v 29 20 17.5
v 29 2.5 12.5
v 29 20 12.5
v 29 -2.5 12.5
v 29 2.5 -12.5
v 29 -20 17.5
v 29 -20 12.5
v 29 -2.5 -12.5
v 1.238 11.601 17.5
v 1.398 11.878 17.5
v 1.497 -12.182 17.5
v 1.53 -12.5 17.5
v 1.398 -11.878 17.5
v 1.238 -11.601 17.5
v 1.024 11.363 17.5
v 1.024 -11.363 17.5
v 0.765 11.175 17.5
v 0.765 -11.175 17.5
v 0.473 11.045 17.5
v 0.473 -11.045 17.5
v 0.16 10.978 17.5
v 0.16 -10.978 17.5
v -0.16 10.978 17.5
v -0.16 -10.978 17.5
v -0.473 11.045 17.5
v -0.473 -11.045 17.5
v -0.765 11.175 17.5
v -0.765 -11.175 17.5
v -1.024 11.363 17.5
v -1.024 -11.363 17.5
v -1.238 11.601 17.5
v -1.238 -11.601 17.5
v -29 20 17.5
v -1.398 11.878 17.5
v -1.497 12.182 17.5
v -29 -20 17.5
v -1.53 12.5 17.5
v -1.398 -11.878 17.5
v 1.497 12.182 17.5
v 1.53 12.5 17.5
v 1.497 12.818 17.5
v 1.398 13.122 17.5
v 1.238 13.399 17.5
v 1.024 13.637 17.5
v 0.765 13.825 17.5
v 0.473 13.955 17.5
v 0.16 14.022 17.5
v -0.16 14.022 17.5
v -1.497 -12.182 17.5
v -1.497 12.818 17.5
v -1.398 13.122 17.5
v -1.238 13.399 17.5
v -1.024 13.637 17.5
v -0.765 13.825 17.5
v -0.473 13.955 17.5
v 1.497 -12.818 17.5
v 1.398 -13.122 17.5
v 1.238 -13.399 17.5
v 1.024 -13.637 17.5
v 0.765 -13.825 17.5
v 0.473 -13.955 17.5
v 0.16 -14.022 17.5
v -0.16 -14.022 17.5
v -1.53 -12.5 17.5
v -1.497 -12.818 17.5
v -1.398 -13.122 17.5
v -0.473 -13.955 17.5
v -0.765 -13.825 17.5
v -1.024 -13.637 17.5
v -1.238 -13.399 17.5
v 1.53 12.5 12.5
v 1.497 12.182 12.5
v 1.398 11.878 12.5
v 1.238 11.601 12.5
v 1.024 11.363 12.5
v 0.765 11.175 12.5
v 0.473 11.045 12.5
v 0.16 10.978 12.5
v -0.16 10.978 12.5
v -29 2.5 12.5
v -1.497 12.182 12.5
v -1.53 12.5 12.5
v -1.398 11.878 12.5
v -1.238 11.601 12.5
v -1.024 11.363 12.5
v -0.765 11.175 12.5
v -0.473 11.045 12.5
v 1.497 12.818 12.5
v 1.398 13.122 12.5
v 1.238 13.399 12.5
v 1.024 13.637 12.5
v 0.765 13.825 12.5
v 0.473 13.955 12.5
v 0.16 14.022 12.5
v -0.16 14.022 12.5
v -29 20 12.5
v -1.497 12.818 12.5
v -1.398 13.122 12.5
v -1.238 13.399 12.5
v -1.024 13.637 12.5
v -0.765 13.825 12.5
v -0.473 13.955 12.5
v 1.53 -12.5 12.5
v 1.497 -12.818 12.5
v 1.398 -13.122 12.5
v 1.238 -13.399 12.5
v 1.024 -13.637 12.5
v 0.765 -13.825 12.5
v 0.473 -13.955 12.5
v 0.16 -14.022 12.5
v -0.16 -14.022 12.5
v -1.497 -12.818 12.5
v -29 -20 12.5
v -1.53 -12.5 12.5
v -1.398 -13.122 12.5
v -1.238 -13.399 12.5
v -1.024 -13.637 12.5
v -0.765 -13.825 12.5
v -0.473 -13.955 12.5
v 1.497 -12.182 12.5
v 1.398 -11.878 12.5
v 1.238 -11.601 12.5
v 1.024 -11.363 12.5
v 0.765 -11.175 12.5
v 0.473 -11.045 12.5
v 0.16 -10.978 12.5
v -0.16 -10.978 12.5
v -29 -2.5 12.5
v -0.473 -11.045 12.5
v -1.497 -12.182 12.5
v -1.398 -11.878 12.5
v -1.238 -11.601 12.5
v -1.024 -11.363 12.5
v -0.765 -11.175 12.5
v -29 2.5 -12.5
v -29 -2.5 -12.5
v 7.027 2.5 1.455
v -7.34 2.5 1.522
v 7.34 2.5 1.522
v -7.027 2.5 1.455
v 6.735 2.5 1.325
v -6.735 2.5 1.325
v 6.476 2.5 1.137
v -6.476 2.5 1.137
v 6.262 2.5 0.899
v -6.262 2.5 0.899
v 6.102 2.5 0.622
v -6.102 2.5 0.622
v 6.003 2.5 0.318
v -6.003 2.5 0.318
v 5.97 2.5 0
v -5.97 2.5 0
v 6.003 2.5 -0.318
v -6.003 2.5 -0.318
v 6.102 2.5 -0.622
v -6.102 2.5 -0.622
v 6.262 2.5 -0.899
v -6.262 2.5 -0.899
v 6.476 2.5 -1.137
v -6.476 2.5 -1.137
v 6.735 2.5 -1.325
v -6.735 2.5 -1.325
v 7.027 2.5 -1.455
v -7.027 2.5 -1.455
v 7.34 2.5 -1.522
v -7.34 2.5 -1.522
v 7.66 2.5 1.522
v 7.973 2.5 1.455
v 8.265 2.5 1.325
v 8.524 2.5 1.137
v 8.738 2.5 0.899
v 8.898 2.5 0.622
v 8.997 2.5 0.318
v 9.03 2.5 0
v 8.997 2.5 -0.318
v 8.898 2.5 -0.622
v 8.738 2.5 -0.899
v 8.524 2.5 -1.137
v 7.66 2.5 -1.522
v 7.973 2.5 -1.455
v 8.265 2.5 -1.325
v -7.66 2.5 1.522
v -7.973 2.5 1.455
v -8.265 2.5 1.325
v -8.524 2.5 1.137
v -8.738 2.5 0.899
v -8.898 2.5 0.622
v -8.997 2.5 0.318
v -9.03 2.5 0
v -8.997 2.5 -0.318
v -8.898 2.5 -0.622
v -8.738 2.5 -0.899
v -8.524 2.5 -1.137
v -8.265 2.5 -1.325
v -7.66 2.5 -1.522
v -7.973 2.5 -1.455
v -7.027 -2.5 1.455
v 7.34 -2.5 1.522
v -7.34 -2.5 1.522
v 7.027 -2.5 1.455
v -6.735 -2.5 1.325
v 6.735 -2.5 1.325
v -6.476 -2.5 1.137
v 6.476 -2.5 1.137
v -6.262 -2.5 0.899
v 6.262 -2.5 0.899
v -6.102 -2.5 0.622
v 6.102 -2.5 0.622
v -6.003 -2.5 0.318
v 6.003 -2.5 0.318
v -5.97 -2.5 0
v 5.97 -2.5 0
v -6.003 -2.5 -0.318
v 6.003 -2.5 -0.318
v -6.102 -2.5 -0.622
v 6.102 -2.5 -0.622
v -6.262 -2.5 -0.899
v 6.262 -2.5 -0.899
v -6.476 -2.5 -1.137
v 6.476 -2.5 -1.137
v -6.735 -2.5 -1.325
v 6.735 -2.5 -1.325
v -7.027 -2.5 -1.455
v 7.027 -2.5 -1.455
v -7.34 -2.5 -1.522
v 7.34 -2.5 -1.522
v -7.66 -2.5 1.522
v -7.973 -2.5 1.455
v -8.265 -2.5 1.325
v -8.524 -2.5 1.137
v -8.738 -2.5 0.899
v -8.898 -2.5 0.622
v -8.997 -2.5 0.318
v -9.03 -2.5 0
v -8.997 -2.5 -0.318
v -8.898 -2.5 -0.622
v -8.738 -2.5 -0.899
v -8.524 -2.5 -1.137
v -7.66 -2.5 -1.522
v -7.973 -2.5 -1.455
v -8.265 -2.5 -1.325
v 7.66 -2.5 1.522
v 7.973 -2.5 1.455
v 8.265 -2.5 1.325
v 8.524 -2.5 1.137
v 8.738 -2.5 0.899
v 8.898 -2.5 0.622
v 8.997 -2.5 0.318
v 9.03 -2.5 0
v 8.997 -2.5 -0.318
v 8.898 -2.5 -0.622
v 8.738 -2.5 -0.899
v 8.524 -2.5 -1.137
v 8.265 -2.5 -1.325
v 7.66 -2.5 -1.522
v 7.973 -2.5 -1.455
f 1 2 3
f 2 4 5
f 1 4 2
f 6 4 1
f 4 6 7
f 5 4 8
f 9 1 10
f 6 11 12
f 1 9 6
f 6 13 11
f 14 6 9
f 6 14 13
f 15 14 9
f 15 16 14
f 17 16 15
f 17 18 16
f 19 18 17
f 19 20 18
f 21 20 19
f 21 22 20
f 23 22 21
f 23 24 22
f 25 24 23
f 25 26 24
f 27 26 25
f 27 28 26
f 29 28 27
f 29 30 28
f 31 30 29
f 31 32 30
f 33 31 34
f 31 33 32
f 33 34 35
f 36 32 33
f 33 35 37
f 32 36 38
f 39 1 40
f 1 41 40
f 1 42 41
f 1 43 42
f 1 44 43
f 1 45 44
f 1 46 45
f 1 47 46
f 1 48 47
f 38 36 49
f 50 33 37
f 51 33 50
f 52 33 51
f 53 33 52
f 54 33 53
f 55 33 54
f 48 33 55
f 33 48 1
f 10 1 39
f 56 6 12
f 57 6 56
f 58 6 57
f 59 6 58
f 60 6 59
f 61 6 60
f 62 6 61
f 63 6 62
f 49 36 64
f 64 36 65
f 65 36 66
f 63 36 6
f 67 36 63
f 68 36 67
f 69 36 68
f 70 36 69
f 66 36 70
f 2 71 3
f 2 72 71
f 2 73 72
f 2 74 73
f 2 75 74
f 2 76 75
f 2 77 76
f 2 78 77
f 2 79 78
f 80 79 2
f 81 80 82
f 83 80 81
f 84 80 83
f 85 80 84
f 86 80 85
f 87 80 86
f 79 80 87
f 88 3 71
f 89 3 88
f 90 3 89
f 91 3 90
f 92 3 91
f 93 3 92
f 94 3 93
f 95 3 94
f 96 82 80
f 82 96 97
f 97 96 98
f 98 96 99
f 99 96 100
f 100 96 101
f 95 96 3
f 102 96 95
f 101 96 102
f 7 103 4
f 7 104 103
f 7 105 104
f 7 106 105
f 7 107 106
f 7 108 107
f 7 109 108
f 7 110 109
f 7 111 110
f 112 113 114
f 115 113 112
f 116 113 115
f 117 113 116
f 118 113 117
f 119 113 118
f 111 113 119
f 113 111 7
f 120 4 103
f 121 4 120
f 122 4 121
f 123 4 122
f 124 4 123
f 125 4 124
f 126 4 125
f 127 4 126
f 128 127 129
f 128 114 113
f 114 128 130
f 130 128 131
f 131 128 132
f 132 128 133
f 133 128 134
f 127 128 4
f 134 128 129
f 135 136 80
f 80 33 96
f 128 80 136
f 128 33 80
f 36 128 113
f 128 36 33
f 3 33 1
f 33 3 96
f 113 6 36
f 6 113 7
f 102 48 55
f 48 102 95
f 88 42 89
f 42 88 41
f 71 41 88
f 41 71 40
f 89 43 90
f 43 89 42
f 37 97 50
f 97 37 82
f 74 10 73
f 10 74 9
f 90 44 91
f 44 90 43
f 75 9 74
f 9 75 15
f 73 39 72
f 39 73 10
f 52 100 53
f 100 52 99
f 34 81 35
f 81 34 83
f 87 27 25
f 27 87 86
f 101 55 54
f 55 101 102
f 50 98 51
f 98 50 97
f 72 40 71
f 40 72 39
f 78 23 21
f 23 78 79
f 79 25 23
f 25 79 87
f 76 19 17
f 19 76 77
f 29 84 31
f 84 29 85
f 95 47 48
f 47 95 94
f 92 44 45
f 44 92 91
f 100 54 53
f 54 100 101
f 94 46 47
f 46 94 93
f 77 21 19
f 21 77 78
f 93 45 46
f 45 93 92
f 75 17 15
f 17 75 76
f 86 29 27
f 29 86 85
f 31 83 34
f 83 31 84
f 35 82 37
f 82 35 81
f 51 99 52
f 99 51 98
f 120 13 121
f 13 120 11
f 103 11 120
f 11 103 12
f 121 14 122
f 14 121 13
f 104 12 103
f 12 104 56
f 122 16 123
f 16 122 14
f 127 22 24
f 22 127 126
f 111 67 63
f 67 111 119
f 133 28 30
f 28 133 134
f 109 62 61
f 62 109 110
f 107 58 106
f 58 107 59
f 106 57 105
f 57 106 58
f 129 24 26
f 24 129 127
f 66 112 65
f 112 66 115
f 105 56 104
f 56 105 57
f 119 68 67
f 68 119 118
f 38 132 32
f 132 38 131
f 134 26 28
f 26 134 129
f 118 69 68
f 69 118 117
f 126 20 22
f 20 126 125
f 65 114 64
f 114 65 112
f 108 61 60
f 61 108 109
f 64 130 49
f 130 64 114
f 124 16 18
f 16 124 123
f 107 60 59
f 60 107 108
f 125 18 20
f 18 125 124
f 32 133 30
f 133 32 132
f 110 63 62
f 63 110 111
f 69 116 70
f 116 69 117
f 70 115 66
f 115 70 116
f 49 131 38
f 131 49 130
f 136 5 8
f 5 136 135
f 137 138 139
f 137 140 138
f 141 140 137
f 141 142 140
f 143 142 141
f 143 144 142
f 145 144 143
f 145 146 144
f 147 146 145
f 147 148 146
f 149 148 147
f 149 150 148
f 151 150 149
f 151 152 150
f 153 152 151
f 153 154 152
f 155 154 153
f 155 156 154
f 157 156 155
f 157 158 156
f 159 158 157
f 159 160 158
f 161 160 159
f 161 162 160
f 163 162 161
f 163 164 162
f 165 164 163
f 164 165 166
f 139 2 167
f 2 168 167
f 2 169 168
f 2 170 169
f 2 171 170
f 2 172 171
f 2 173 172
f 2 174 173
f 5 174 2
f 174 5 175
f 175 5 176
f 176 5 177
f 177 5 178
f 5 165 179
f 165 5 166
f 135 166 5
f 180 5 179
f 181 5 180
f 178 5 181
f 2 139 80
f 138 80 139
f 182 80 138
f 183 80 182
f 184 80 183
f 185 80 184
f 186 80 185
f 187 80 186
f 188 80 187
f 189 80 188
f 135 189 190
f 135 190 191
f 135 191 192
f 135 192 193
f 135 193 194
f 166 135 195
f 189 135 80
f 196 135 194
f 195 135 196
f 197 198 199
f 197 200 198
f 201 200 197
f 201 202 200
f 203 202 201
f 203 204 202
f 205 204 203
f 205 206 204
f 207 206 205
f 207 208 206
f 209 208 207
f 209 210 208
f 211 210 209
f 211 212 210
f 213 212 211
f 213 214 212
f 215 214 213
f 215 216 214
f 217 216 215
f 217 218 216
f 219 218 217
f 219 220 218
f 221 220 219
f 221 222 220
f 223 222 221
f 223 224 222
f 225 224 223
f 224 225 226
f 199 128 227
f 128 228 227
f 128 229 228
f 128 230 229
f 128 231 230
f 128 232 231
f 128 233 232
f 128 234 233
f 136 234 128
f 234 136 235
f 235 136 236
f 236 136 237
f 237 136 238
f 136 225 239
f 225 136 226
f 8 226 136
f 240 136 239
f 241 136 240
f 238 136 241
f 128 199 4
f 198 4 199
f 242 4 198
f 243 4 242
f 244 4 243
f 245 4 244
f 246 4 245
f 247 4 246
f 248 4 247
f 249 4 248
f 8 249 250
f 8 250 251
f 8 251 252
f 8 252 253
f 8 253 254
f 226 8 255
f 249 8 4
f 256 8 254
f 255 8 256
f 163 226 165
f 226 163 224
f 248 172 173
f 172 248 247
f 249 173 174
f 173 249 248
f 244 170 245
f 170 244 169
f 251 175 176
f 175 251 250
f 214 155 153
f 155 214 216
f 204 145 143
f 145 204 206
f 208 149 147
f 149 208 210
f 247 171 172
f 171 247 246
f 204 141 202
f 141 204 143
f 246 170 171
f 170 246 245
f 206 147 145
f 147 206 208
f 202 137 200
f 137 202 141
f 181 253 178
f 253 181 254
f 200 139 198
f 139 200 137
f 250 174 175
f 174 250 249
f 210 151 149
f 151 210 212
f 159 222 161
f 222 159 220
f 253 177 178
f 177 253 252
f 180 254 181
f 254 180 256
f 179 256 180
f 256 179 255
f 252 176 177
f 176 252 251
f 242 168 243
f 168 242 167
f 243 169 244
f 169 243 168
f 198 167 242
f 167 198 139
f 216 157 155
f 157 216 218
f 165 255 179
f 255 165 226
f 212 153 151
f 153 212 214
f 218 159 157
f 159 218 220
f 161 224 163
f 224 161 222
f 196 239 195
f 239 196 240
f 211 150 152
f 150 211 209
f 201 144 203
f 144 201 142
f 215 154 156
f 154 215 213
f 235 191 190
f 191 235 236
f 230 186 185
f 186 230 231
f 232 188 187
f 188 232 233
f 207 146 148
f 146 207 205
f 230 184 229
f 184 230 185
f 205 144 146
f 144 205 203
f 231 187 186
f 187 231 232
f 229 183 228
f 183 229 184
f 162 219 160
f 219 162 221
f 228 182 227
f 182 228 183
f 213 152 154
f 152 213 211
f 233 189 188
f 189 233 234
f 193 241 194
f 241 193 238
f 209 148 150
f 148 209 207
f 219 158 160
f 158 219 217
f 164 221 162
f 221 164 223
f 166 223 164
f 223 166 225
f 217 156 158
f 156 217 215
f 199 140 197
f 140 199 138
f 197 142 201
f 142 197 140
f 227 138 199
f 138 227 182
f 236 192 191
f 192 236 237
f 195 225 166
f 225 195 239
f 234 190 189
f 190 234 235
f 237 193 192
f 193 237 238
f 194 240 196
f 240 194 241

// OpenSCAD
module bottom_mount() {
  mount_w = 58.0;
  mount_l = 5.0;
  mount_h = 25.0;
  mount_thickness = 5.0;

  tolerance = 1.02;
  mount_screw_size = 3.0;
  mount_screw_safe_size = mount_screw_size * tolerance;

  over_hang_holes_w = 34.0;
  bottom_hang_holes_w = 25.0;
  camera_braket_mount_w = 15.0;

  difference() {
    // Top plate
    translate([0.0, 0.0, mount_h / 2 + mount_thickness / 2])
      cube([mount_w, 40, mount_thickness], center=true);

    // Bottom mount holes
    translate([0.0, bottom_hang_holes_w / 2.0, 15.0])
      cylinder(r=mount_screw_safe_size/2, h=20, center=true);

    translate([0.0, -bottom_hang_holes_w / 2.0, 15.0])
      cylinder(r=mount_screw_safe_size/2, h=20, center=true);
  }

  difference() {
    // Mount
    cube([mount_w, mount_l, mount_h], center=true);

    // Mount holes
    translate([camera_braket_mount_w / 2.0, 0.0, 0.0])
      rotate([90.0, 0.0, 0.0])
        cylinder(r=mount_screw_safe_size/2, h=20, center=true);

    translate([-camera_braket_mount_w / 2.0, 0.0, 0.0])
      rotate([90.0, 0.0, 0.0])
        cylinder(r=mount_screw_safe_size/2, h=20, center=true);
  }
}

$fn=30;
bottom_mount();
